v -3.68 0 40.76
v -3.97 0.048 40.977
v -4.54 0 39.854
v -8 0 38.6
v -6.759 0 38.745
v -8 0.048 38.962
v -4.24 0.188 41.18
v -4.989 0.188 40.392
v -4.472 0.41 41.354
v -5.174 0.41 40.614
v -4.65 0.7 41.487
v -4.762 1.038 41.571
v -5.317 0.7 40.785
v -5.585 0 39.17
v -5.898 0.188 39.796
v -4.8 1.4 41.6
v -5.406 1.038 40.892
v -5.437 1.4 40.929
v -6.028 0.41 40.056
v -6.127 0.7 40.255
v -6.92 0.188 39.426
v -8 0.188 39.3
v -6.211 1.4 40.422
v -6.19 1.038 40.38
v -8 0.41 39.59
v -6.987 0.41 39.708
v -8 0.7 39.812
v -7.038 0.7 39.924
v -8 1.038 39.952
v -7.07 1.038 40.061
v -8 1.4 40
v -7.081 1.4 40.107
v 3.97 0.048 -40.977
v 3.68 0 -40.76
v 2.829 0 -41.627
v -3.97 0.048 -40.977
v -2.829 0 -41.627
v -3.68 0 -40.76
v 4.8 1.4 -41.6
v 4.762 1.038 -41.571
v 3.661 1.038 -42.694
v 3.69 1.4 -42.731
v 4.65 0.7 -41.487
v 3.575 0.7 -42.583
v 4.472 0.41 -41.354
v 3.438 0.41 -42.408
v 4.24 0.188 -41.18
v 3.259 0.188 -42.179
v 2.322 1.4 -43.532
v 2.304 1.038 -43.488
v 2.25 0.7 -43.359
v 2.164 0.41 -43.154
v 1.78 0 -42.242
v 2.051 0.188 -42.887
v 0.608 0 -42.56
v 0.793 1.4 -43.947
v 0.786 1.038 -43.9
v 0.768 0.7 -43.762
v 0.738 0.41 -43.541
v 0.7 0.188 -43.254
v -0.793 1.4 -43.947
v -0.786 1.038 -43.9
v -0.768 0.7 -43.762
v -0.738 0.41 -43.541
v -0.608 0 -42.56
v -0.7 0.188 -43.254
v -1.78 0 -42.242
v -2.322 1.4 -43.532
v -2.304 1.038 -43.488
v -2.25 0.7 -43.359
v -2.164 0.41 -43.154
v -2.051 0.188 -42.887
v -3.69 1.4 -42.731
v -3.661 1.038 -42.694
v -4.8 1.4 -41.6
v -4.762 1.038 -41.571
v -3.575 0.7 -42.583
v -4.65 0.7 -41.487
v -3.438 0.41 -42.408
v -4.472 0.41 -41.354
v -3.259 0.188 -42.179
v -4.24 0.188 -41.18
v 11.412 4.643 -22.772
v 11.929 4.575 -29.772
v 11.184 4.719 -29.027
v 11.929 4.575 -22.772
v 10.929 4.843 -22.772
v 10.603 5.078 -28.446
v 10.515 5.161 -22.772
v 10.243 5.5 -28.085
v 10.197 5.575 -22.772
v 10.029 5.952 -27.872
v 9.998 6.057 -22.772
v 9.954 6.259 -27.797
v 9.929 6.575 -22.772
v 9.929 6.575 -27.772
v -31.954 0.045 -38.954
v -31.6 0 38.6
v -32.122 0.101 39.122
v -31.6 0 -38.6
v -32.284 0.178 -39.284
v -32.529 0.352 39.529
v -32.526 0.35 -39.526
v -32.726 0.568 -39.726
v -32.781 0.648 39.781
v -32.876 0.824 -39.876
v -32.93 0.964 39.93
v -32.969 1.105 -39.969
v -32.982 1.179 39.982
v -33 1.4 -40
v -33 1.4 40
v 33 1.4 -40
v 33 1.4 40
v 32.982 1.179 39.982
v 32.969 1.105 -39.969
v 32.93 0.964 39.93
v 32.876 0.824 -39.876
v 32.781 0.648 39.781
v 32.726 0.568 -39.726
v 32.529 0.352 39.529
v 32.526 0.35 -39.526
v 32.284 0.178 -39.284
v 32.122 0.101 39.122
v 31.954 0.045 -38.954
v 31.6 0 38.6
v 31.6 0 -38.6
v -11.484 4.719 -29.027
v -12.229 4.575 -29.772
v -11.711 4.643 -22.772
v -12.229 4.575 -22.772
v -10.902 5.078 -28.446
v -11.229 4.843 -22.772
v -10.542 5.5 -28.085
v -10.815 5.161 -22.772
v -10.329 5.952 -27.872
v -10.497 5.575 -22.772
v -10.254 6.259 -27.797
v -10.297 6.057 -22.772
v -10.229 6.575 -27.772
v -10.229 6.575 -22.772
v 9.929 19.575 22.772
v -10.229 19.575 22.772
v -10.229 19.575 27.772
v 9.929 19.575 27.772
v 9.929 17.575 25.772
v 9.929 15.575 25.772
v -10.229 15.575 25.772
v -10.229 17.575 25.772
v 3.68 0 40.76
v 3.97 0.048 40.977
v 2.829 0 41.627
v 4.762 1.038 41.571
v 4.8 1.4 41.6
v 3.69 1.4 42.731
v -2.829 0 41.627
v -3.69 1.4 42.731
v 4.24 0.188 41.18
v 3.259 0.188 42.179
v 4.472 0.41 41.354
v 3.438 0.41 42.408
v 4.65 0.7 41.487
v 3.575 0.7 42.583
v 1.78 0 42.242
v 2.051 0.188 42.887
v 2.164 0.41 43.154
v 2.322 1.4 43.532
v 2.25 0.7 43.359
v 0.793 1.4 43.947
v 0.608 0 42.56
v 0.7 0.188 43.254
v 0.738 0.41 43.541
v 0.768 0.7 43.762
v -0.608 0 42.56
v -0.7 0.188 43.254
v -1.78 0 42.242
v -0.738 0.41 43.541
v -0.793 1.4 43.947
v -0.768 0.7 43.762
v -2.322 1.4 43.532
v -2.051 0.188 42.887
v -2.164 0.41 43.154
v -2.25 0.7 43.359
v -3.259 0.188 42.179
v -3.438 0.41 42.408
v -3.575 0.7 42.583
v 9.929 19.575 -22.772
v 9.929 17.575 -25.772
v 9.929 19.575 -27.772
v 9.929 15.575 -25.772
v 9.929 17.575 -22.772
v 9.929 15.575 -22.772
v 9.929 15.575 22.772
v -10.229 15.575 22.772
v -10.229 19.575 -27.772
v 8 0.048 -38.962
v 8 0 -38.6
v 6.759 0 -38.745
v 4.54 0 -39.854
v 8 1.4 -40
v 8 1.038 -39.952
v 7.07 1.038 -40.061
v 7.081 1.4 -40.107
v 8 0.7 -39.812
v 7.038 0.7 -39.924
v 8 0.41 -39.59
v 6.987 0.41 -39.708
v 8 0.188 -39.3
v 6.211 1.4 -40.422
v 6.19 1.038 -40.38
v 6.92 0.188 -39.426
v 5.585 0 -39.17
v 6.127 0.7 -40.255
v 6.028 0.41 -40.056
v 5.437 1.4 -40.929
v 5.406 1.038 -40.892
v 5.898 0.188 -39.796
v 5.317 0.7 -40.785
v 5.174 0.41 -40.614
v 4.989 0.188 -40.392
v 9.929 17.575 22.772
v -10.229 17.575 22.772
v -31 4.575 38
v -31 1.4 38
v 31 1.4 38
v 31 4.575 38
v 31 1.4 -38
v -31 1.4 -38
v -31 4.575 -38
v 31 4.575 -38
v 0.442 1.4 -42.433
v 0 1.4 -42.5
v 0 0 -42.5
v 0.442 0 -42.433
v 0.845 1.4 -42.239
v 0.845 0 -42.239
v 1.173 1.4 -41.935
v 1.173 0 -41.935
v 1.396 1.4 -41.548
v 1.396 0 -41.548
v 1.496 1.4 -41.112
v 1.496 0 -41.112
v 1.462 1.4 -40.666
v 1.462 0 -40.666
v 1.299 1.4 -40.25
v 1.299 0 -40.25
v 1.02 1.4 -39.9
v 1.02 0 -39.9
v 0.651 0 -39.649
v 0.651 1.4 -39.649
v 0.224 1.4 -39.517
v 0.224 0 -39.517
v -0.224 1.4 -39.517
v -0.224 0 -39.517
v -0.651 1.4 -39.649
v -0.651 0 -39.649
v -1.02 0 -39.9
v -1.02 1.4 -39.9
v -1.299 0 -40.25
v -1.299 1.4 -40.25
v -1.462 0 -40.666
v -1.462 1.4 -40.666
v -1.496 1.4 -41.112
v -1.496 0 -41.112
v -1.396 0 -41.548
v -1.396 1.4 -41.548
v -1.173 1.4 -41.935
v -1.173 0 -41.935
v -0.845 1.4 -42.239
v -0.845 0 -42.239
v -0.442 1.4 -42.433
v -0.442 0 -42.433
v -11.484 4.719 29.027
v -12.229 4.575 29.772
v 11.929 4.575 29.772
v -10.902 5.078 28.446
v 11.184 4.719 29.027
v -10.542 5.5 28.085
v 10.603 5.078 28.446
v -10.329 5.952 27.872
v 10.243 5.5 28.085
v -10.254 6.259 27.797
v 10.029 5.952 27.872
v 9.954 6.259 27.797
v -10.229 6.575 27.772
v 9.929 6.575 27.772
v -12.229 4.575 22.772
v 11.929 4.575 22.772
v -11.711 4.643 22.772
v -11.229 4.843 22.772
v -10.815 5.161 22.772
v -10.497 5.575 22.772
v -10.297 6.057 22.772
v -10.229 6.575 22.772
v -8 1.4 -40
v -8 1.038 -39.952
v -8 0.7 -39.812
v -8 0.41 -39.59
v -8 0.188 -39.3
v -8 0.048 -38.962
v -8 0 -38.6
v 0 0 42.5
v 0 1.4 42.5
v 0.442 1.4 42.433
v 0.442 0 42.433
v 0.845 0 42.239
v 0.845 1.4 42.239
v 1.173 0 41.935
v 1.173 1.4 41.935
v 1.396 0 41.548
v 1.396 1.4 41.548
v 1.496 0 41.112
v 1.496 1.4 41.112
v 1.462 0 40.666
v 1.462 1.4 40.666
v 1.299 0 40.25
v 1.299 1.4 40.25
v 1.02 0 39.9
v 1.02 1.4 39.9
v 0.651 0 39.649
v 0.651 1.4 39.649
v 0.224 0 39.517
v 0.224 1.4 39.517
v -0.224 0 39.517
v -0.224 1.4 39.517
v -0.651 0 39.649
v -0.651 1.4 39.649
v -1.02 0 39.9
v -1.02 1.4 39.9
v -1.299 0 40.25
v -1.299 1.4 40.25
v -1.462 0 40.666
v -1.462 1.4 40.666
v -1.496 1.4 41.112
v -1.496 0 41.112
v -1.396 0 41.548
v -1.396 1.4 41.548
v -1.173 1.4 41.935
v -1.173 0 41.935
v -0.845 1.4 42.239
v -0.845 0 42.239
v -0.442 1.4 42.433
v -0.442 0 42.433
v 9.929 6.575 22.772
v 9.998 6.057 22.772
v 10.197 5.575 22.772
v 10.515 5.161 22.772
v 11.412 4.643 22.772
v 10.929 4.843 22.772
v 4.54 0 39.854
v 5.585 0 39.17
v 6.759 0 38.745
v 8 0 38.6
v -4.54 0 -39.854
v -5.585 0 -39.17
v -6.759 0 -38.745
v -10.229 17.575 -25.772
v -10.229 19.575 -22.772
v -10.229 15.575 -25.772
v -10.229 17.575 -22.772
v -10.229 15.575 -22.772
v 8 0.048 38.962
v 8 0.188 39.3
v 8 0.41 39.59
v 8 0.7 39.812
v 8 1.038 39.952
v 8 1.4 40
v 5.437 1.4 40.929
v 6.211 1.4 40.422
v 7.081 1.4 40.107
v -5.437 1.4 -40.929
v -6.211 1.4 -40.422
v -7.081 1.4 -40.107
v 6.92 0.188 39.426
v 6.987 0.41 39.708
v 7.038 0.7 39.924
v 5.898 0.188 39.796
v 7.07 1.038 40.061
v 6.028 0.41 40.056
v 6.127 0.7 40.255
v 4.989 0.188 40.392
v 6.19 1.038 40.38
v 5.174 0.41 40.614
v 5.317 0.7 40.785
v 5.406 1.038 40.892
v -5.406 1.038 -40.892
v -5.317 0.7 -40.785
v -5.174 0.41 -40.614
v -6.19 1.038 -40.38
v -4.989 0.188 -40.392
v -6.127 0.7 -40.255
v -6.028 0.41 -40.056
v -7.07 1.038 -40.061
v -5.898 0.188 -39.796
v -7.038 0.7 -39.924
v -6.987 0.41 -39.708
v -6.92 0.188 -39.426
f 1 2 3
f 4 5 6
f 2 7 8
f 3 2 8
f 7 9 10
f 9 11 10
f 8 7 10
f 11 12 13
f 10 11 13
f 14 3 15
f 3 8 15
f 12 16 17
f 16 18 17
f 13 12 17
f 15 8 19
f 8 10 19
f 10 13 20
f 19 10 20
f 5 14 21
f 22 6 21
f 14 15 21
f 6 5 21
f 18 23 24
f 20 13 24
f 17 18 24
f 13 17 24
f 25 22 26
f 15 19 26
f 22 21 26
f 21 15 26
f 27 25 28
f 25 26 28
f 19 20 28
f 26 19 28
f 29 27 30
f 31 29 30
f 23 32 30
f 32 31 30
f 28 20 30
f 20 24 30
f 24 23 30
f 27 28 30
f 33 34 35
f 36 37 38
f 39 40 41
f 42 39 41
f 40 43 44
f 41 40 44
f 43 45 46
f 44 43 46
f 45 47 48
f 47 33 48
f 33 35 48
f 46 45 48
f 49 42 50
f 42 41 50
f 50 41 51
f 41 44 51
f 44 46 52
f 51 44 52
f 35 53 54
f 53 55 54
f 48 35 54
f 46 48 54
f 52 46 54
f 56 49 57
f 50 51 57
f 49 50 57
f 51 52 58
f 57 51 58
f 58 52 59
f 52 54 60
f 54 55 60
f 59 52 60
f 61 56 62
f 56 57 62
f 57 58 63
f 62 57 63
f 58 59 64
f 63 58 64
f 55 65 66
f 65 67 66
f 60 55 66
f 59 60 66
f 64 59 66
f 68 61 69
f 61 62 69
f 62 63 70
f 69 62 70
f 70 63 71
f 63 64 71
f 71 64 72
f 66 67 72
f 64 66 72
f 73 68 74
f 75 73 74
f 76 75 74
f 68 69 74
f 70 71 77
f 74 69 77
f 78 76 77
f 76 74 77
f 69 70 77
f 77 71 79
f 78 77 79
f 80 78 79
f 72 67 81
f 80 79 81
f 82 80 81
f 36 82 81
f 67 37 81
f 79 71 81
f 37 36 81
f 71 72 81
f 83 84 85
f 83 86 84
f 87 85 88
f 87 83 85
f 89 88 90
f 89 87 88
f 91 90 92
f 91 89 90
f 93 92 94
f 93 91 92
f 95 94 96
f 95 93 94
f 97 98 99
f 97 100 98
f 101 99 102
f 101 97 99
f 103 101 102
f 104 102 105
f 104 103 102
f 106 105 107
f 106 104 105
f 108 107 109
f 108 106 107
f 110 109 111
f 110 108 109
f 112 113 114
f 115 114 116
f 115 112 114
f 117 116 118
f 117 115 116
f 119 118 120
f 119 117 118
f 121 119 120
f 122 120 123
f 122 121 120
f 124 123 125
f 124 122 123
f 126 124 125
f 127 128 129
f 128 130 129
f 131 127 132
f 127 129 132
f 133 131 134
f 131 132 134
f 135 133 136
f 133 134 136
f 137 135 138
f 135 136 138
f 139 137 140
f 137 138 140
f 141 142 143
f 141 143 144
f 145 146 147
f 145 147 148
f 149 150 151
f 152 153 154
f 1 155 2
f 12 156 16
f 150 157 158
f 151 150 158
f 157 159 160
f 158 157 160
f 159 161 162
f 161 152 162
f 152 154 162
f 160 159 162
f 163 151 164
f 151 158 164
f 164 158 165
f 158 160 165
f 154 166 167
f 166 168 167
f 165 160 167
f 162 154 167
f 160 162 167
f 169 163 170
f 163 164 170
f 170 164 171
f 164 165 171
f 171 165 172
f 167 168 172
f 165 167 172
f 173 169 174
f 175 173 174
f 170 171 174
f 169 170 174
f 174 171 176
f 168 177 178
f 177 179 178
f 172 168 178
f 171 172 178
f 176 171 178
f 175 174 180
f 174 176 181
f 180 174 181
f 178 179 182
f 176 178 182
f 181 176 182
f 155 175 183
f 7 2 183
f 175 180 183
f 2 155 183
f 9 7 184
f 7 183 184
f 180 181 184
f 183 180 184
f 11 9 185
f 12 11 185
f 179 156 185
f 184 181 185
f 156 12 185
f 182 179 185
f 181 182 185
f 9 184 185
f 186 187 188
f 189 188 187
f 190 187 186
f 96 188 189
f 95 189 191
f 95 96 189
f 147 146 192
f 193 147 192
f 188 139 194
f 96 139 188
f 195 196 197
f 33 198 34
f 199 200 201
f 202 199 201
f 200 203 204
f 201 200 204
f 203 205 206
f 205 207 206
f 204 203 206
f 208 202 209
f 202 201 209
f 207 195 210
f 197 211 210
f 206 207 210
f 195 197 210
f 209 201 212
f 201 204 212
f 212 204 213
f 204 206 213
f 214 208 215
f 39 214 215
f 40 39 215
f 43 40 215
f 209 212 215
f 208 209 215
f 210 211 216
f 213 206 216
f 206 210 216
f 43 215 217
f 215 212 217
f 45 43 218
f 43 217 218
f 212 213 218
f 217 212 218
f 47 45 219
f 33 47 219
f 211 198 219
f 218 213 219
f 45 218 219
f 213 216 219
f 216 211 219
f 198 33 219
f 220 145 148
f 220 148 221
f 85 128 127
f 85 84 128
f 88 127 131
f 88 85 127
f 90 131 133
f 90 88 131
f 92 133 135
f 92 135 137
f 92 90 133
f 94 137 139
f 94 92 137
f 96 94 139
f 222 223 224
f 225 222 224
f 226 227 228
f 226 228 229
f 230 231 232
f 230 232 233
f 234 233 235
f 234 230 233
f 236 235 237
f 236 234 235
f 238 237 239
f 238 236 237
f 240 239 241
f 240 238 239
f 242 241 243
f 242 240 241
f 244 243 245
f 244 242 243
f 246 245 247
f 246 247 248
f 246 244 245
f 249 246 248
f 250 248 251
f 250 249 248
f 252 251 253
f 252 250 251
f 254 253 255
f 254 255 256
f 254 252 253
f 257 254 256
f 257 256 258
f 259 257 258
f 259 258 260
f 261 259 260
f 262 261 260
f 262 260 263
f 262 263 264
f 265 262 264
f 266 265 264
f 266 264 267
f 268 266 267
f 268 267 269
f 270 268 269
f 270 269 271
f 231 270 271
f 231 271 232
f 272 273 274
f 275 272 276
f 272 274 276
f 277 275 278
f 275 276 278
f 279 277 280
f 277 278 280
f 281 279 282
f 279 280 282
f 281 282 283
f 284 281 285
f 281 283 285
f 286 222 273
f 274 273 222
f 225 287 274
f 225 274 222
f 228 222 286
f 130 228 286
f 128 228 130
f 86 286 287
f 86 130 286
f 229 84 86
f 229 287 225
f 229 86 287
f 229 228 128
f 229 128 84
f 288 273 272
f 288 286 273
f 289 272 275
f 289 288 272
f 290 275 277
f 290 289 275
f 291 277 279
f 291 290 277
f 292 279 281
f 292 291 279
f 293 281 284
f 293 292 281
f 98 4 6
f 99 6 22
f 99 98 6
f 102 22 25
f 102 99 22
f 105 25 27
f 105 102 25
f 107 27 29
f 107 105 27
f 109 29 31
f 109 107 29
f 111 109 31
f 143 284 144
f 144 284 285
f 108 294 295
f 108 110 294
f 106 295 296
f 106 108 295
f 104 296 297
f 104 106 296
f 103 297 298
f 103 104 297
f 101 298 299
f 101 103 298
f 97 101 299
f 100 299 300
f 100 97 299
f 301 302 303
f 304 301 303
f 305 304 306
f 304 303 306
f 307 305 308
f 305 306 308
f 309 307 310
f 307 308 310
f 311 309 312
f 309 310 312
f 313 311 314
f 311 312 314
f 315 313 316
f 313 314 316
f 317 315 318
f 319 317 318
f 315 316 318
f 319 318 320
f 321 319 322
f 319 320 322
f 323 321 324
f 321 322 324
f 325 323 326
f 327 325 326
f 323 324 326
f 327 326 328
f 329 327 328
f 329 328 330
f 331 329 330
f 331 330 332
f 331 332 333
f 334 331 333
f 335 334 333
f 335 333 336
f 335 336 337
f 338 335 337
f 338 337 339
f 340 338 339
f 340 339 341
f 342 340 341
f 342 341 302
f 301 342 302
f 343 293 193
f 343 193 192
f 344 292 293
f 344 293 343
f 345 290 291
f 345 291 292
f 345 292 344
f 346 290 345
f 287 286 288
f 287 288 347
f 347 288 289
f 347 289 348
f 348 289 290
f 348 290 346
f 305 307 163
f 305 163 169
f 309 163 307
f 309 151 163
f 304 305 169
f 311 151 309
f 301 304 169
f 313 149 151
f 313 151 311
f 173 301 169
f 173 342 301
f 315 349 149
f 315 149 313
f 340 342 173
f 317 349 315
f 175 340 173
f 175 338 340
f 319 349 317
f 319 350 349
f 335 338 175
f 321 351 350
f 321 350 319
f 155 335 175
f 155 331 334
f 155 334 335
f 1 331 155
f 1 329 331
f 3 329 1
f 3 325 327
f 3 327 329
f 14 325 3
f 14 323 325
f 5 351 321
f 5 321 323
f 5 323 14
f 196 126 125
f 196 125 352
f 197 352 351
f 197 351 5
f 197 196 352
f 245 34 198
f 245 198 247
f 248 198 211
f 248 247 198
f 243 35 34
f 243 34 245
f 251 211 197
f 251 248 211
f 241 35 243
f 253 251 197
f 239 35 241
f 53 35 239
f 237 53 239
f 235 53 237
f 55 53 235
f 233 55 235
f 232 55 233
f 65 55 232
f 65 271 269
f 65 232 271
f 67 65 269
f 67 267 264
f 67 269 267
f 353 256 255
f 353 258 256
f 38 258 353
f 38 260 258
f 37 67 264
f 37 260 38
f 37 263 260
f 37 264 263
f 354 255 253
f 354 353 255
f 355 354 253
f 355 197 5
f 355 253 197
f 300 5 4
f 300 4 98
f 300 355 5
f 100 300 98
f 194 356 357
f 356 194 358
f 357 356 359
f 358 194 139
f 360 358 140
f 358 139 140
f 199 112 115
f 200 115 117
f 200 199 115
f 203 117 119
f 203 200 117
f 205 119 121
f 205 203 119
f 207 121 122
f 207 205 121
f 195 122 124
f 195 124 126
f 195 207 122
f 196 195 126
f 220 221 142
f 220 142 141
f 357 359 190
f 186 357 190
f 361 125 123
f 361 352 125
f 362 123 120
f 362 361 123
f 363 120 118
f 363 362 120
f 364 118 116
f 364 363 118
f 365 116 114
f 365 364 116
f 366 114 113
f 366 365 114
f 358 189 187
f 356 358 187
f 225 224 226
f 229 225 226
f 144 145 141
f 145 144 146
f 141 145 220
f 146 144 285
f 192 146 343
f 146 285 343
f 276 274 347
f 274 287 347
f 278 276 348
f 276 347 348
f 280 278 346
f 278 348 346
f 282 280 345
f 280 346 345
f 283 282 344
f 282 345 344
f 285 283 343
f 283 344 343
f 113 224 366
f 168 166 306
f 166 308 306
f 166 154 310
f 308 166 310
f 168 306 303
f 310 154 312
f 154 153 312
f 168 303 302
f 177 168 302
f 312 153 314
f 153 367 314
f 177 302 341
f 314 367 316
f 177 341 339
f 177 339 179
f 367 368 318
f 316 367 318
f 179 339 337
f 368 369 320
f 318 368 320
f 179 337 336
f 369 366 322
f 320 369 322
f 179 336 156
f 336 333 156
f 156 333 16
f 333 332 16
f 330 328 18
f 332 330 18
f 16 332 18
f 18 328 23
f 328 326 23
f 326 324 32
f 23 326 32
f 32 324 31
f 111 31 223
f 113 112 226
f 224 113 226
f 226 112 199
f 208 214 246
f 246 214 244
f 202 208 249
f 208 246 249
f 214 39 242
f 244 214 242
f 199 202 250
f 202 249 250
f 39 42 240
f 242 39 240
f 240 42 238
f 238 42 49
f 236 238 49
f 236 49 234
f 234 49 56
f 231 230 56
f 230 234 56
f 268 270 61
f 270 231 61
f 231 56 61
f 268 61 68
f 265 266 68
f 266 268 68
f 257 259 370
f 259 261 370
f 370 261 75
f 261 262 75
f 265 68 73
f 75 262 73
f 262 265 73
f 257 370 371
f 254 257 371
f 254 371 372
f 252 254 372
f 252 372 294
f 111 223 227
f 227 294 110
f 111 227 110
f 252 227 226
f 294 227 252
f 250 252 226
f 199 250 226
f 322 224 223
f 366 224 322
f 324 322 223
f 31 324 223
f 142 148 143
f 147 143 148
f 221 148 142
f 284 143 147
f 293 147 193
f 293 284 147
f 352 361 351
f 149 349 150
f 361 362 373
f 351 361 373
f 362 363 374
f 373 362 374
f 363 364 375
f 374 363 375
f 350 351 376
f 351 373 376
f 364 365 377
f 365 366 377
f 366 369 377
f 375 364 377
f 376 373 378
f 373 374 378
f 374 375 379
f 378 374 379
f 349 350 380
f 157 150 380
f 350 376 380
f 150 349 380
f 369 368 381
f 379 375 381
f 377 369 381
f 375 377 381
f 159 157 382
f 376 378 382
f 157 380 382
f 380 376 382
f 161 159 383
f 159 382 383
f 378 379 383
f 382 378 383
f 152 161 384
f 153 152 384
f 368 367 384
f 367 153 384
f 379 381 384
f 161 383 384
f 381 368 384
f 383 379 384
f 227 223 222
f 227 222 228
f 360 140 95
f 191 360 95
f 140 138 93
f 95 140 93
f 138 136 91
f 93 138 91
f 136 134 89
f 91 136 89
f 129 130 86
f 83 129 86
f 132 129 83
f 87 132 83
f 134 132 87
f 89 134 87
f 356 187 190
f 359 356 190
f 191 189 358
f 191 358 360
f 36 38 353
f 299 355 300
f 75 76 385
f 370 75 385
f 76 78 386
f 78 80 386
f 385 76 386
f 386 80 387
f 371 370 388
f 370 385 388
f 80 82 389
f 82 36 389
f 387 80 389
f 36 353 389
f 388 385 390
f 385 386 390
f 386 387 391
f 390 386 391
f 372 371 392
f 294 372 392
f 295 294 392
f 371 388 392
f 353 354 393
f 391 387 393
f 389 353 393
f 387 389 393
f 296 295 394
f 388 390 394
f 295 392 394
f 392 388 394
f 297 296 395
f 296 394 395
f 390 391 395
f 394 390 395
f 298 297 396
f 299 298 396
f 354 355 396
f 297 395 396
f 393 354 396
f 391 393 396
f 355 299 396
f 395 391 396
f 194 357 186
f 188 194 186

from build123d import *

# Parameters (mm, degrees)
SKETCH1_W           = 62
SKETCH1_H           = 76
BOSS_EXTRUDE1_DEPTH = 4.575
SKETCH11_W          = 66
SKETCH11_H          = 80
BOSS_EXTRUDE5_DEPTH = 1.4
BOSS_EXTRUDE3_DEPTH = 1.4
CUT_EXTRUDE3_REACH  = 57.092
SKETCH12_R          = 1.5
FILLET1_R           = 1.4
SKETCH21_W          = 20.158508521
SKETCH21_H          = 5
BOSS_EXTRUDE8_DEPTH = 15
SKETCH33_W          = 3
SKETCH33_H          = 2
CUT_EXTRUDE7_DEPTH  = 25
FILLET2_R           = 2


with BuildPart() as part:
    # Sketch1 → Boss-Extrude1 (new body)
    with BuildSketch(Plane(origin=(0, 0, 0), x_dir=(1, 0, 0), z_dir=(0, 1, 0))):
        Rectangle(SKETCH1_W, SKETCH1_H)
    extrude(amount=BOSS_EXTRUDE1_DEPTH)

    # Sketch11 → Boss-Extrude5 (add)
    with BuildSketch(Plane(origin=(0, 0, 0), x_dir=(-1, 0, 0), z_dir=(0, -1, 0))):
        Rectangle(SKETCH11_W, SKETCH11_H)
    extrude(amount=-BOSS_EXTRUDE5_DEPTH)

    # Sketch4 → Boss-Extrude3 (add)
    with BuildSketch(Plane(origin=(0, 0, 0), x_dir=(1, 0, 0), z_dir=(0, 1, 0))):
        with BuildLine():
            Line((-8, -40), (8, -40))
            ThreePointArc((8, -40), (6.211145618, -40.422291236), (4.8, -41.6))
            ThreePointArc((4.8, -41.6), (0, -44), (-4.8, -41.6))
            ThreePointArc((-4.8, -41.6), (-6.211145618, -40.422291236), (-8, -40))
        make_face()
    boss_extrude3 = extrude(amount=BOSS_EXTRUDE3_DEPTH)

    # Sketch12 → Cut-Extrude3 (cut, up to next)
    with BuildSketch(Plane(origin=(0, 1.4, 0), x_dir=(1, 0, 0), z_dir=(0, 1, 0)), mode=Mode.PRIVATE) as cut_extrude3_sk1:
        with Locations(Location((0, -41, 0), (0, 0, 270))):
            Circle(SKETCH12_R)
    cut_extrude3_tool1 = extrude(cut_extrude3_sk1.sketch, amount=-CUT_EXTRUDE3_REACH, mode=Mode.PRIVATE) & part.part
    cut_extrude3 = cut_extrude3_tool1.solids().sort_by_distance((0, 1.4, 41))[0]
    add(cut_extrude3, mode=Mode.SUBTRACT)

    # Mirror1: Boss-Extrude3, Cut-Extrude3 across plane
    add(boss_extrude3.mirror(Plane.XY))
    add(cut_extrude3.mirror(Plane.XY), mode=Mode.SUBTRACT)

    # Fillet1
    fillet1_edges = [part.edges().sort_by_distance(p)[0] for p in [
        (20.5, 0, -40),
        (6.211145618, 0, -40.422291236),
        (0, 0, -44),
        (-6.211145618, 0, -40.422291236),
        (-20.5, 0, -40),
        (-33, 0, 0),
        (-20.5, 0, 40),
        (-6.211145618, 0, 40.422291236),
        (0, 0, 44),
        (6.211145618, 0, 40.422291236),
        (20.5, 0, 40),
        (33, 0, 0),
    ]]
    fillet(fillet1_edges, radius=FILLET1_R - 0.0001)  # a hair under: the kernel refuses the full size

    # Sketch21 → Boss-Extrude8 (add)
    with BuildSketch(Plane(origin=(0, 4.575, 0), x_dir=(1, 0, 0), z_dir=(0, 1, 0))):
        with Locations((-0.149821344, -25.272162816)):
            Rectangle(SKETCH21_W, SKETCH21_H)
    boss_extrude8 = extrude(amount=BOSS_EXTRUDE8_DEPTH)

    # Sketch33 → Cut-Extrude7 (cut)
    with BuildSketch(Plane(origin=(9.929432917, 0, 0), x_dir=(0, 0, -1), z_dir=(1, 0, 0))):
        with Locations((-24.272162816, 16.575)):
            Rectangle(SKETCH33_W, SKETCH33_H)
    cut_extrude7 = extrude(amount=-CUT_EXTRUDE7_DEPTH, mode=Mode.SUBTRACT)

    # Mirror2: Boss-Extrude8, Cut-Extrude7 across plane
    add(boss_extrude8.mirror(Plane.XY))
    add(cut_extrude7.mirror(Plane.XY), mode=Mode.SUBTRACT)

    # Fillet2
    fillet2_edges = [part.edges().sort_by_distance(p)[0] for p in [
        (-10.229075604, 4.575, 25.272162816),
        (-0.149821344, 4.575, 27.772162816),
        (9.929432917, 4.575, 25.272162816),
        (9.929432917, 4.575, -25.272162816),
        (-10.229075604, 4.575, -25.272162816),
        (-0.149821344, 4.575, -27.772162816),
    ]]
    fillet(fillet2_edges, radius=FILLET2_R)


solid = part.part
